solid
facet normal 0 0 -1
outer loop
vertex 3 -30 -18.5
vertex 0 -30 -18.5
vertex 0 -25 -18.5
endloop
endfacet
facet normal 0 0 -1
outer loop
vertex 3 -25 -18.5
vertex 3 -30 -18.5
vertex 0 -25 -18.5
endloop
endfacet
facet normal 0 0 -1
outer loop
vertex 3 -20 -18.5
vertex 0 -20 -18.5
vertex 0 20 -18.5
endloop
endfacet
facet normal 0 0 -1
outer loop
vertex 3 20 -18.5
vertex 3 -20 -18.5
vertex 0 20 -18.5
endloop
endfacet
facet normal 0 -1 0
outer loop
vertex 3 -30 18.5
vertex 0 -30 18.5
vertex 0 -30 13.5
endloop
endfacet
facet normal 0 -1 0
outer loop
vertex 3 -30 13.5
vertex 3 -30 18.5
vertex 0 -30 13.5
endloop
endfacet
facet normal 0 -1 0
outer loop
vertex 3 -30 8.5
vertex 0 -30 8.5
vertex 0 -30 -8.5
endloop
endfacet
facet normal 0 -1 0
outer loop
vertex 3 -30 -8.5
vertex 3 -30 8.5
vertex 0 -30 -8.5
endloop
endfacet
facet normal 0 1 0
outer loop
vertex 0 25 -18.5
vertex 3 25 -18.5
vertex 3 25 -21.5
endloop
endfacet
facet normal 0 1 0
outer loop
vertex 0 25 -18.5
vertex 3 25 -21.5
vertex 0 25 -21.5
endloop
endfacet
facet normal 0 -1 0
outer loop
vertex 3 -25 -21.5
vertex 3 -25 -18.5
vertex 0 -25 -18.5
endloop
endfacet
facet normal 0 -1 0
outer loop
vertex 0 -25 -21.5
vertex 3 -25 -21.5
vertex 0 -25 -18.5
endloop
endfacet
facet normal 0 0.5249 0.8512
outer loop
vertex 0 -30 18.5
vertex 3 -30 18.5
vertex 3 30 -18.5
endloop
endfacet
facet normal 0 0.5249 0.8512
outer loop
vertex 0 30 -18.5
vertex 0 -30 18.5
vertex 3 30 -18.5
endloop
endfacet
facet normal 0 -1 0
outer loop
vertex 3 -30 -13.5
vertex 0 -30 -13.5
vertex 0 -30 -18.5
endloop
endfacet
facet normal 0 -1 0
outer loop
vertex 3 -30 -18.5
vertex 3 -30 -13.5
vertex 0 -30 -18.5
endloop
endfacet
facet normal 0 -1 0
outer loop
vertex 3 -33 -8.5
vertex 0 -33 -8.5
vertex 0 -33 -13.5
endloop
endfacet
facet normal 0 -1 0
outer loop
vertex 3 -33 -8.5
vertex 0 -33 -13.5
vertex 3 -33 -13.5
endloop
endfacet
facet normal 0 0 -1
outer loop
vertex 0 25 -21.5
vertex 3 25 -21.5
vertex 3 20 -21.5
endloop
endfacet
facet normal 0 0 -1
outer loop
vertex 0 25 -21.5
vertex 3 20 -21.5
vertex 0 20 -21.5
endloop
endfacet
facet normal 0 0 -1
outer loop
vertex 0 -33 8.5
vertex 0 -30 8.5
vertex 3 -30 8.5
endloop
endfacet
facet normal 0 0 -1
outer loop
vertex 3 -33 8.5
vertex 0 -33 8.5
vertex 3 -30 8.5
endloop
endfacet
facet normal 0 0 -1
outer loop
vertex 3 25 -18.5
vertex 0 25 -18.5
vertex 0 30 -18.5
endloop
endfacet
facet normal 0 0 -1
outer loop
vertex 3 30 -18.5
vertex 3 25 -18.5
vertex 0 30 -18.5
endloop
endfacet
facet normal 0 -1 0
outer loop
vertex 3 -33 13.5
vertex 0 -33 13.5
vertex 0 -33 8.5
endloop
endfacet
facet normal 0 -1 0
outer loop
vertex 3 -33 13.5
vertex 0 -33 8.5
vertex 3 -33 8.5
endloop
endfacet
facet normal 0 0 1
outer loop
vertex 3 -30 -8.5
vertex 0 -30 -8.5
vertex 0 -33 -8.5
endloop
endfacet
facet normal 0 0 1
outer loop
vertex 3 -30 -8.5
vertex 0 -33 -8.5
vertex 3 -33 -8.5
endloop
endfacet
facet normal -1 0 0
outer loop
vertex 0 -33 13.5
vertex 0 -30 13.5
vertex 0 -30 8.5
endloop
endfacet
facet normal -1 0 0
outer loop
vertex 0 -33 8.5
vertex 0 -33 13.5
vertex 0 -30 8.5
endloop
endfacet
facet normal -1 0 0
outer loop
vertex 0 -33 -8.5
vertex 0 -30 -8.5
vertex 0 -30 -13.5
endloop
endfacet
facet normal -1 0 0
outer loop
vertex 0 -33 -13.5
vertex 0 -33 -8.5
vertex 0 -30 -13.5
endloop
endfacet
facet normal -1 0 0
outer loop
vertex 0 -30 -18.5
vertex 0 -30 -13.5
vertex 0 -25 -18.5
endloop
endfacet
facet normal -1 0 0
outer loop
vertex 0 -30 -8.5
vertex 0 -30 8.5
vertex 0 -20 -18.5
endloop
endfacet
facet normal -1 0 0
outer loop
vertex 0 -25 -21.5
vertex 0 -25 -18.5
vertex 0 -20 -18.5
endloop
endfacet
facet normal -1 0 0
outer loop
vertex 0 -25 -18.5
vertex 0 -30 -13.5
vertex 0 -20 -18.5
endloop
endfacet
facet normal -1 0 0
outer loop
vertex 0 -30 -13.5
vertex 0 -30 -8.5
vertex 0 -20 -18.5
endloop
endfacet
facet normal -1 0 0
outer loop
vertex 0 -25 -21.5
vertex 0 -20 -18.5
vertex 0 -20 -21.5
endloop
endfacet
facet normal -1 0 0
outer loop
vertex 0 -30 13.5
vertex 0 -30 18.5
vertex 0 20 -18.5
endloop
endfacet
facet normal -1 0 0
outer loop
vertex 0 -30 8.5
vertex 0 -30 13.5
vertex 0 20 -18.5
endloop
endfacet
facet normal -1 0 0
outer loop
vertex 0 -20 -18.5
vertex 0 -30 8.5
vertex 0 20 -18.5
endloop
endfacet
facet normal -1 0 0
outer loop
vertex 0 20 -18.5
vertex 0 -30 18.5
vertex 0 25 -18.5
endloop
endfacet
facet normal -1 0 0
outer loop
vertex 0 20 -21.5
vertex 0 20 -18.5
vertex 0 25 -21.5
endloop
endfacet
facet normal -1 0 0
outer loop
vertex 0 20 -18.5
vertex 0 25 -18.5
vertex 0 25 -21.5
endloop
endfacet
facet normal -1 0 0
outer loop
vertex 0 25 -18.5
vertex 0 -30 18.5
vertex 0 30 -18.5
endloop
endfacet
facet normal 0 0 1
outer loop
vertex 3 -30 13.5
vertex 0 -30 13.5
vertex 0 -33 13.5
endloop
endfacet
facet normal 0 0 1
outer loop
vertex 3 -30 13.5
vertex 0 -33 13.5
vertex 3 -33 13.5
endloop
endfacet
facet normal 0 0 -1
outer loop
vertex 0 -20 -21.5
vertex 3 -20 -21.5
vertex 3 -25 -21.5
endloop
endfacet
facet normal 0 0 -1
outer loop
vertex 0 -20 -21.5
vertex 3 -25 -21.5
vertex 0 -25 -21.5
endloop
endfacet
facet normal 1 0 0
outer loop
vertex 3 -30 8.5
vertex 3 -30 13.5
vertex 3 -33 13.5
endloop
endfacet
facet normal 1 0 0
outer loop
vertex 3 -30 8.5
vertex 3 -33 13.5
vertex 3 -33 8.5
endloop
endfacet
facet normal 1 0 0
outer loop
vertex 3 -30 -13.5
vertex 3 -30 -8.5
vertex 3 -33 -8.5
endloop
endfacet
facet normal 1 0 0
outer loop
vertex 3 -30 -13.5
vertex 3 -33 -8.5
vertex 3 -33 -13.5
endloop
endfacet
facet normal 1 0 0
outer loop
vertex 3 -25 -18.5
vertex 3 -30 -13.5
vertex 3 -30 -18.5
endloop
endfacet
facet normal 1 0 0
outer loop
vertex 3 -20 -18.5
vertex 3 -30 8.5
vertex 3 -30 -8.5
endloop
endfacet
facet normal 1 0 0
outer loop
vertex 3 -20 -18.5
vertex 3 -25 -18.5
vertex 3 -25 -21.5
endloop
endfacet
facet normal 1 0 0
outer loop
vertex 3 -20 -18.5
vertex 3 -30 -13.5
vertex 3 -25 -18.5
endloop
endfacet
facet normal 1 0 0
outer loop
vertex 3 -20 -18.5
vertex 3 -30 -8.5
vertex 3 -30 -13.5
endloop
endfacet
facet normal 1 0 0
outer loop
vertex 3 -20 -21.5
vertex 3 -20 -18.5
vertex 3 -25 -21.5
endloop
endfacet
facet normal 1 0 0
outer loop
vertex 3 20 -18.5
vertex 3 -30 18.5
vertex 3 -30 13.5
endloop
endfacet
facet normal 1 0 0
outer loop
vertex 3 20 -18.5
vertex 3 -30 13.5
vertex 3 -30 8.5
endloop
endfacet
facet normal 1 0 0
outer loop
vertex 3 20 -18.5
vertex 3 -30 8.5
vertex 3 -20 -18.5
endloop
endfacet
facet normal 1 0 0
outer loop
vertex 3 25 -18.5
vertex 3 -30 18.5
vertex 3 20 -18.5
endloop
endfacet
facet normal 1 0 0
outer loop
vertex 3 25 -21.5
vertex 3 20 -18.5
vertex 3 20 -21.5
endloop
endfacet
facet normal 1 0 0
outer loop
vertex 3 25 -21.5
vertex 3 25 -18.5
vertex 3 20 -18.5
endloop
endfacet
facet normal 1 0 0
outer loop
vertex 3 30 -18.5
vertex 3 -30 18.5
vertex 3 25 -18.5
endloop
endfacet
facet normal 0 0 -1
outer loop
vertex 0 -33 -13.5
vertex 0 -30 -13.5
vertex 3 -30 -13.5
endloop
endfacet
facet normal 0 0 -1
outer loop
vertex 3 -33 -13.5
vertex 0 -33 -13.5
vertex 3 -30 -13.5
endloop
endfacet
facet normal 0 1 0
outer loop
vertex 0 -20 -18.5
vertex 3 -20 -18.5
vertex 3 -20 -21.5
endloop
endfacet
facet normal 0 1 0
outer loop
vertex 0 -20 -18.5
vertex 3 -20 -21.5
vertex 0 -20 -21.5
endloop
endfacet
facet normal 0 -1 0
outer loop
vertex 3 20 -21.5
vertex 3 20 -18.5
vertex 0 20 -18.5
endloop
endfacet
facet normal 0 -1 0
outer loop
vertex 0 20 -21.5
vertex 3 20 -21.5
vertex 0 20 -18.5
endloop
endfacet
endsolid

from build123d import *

# Parameters (mm, degrees)
SKETCH1_W           = 37
SKETCH1_H           = 60
BOSS_EXTRUDE1_DEPTH = 3
CUT_EXTRUDE1_DEPTH  = 3
SKETCH3_W           = 3
SKETCH3_H           = 5
BOSS_EXTRUDE2_DEPTH = 3
SKETCH4_W           = 3
SKETCH4_H           = 5
BOSS_EXTRUDE3_DEPTH = 3


with BuildPart() as part:
    # Sketch1 → Boss-Extrude1 (new body)
    with BuildSketch(Plane(origin=(0, 0, 0), x_dir=(0, 0, -1), z_dir=(1, 0, 0))):
        Rectangle(SKETCH1_W, SKETCH1_H)
    extrude(amount=BOSS_EXTRUDE1_DEPTH)

    # Sketch2 → Cut-Extrude1 (cut)
    with BuildSketch(Plane(origin=(3, 0, 0), x_dir=(0, 0, -1), z_dir=(1, 0, 0))):
        Polygon((-18.5, -30), (18.5, 30), (-18.5, 30), align=None)
    extrude(amount=-CUT_EXTRUDE1_DEPTH, mode=Mode.SUBTRACT)

    # Sketch3 → Boss-Extrude2 (add)
    with BuildSketch(Plane.XZ.offset(30)):
        with Locations((1.5, 11)):
            Rectangle(SKETCH3_W, SKETCH3_H)
        with Locations((1.5, -11)):
            Rectangle(SKETCH3_W, SKETCH3_H)
    extrude(amount=BOSS_EXTRUDE2_DEPTH)

    # Sketch4 → Boss-Extrude3 (add)
    with BuildSketch(Plane(origin=(0, 0, -18.5), x_dir=(-1, 0, 0), z_dir=(0, 0, -1))):
        with Locations((-1.5, -22.5)):
            Rectangle(SKETCH4_W, SKETCH4_H)
        with Locations((-1.5, 22.5)):
            Rectangle(SKETCH4_W, SKETCH4_H)
    extrude(amount=BOSS_EXTRUDE3_DEPTH)


solid = part.part
